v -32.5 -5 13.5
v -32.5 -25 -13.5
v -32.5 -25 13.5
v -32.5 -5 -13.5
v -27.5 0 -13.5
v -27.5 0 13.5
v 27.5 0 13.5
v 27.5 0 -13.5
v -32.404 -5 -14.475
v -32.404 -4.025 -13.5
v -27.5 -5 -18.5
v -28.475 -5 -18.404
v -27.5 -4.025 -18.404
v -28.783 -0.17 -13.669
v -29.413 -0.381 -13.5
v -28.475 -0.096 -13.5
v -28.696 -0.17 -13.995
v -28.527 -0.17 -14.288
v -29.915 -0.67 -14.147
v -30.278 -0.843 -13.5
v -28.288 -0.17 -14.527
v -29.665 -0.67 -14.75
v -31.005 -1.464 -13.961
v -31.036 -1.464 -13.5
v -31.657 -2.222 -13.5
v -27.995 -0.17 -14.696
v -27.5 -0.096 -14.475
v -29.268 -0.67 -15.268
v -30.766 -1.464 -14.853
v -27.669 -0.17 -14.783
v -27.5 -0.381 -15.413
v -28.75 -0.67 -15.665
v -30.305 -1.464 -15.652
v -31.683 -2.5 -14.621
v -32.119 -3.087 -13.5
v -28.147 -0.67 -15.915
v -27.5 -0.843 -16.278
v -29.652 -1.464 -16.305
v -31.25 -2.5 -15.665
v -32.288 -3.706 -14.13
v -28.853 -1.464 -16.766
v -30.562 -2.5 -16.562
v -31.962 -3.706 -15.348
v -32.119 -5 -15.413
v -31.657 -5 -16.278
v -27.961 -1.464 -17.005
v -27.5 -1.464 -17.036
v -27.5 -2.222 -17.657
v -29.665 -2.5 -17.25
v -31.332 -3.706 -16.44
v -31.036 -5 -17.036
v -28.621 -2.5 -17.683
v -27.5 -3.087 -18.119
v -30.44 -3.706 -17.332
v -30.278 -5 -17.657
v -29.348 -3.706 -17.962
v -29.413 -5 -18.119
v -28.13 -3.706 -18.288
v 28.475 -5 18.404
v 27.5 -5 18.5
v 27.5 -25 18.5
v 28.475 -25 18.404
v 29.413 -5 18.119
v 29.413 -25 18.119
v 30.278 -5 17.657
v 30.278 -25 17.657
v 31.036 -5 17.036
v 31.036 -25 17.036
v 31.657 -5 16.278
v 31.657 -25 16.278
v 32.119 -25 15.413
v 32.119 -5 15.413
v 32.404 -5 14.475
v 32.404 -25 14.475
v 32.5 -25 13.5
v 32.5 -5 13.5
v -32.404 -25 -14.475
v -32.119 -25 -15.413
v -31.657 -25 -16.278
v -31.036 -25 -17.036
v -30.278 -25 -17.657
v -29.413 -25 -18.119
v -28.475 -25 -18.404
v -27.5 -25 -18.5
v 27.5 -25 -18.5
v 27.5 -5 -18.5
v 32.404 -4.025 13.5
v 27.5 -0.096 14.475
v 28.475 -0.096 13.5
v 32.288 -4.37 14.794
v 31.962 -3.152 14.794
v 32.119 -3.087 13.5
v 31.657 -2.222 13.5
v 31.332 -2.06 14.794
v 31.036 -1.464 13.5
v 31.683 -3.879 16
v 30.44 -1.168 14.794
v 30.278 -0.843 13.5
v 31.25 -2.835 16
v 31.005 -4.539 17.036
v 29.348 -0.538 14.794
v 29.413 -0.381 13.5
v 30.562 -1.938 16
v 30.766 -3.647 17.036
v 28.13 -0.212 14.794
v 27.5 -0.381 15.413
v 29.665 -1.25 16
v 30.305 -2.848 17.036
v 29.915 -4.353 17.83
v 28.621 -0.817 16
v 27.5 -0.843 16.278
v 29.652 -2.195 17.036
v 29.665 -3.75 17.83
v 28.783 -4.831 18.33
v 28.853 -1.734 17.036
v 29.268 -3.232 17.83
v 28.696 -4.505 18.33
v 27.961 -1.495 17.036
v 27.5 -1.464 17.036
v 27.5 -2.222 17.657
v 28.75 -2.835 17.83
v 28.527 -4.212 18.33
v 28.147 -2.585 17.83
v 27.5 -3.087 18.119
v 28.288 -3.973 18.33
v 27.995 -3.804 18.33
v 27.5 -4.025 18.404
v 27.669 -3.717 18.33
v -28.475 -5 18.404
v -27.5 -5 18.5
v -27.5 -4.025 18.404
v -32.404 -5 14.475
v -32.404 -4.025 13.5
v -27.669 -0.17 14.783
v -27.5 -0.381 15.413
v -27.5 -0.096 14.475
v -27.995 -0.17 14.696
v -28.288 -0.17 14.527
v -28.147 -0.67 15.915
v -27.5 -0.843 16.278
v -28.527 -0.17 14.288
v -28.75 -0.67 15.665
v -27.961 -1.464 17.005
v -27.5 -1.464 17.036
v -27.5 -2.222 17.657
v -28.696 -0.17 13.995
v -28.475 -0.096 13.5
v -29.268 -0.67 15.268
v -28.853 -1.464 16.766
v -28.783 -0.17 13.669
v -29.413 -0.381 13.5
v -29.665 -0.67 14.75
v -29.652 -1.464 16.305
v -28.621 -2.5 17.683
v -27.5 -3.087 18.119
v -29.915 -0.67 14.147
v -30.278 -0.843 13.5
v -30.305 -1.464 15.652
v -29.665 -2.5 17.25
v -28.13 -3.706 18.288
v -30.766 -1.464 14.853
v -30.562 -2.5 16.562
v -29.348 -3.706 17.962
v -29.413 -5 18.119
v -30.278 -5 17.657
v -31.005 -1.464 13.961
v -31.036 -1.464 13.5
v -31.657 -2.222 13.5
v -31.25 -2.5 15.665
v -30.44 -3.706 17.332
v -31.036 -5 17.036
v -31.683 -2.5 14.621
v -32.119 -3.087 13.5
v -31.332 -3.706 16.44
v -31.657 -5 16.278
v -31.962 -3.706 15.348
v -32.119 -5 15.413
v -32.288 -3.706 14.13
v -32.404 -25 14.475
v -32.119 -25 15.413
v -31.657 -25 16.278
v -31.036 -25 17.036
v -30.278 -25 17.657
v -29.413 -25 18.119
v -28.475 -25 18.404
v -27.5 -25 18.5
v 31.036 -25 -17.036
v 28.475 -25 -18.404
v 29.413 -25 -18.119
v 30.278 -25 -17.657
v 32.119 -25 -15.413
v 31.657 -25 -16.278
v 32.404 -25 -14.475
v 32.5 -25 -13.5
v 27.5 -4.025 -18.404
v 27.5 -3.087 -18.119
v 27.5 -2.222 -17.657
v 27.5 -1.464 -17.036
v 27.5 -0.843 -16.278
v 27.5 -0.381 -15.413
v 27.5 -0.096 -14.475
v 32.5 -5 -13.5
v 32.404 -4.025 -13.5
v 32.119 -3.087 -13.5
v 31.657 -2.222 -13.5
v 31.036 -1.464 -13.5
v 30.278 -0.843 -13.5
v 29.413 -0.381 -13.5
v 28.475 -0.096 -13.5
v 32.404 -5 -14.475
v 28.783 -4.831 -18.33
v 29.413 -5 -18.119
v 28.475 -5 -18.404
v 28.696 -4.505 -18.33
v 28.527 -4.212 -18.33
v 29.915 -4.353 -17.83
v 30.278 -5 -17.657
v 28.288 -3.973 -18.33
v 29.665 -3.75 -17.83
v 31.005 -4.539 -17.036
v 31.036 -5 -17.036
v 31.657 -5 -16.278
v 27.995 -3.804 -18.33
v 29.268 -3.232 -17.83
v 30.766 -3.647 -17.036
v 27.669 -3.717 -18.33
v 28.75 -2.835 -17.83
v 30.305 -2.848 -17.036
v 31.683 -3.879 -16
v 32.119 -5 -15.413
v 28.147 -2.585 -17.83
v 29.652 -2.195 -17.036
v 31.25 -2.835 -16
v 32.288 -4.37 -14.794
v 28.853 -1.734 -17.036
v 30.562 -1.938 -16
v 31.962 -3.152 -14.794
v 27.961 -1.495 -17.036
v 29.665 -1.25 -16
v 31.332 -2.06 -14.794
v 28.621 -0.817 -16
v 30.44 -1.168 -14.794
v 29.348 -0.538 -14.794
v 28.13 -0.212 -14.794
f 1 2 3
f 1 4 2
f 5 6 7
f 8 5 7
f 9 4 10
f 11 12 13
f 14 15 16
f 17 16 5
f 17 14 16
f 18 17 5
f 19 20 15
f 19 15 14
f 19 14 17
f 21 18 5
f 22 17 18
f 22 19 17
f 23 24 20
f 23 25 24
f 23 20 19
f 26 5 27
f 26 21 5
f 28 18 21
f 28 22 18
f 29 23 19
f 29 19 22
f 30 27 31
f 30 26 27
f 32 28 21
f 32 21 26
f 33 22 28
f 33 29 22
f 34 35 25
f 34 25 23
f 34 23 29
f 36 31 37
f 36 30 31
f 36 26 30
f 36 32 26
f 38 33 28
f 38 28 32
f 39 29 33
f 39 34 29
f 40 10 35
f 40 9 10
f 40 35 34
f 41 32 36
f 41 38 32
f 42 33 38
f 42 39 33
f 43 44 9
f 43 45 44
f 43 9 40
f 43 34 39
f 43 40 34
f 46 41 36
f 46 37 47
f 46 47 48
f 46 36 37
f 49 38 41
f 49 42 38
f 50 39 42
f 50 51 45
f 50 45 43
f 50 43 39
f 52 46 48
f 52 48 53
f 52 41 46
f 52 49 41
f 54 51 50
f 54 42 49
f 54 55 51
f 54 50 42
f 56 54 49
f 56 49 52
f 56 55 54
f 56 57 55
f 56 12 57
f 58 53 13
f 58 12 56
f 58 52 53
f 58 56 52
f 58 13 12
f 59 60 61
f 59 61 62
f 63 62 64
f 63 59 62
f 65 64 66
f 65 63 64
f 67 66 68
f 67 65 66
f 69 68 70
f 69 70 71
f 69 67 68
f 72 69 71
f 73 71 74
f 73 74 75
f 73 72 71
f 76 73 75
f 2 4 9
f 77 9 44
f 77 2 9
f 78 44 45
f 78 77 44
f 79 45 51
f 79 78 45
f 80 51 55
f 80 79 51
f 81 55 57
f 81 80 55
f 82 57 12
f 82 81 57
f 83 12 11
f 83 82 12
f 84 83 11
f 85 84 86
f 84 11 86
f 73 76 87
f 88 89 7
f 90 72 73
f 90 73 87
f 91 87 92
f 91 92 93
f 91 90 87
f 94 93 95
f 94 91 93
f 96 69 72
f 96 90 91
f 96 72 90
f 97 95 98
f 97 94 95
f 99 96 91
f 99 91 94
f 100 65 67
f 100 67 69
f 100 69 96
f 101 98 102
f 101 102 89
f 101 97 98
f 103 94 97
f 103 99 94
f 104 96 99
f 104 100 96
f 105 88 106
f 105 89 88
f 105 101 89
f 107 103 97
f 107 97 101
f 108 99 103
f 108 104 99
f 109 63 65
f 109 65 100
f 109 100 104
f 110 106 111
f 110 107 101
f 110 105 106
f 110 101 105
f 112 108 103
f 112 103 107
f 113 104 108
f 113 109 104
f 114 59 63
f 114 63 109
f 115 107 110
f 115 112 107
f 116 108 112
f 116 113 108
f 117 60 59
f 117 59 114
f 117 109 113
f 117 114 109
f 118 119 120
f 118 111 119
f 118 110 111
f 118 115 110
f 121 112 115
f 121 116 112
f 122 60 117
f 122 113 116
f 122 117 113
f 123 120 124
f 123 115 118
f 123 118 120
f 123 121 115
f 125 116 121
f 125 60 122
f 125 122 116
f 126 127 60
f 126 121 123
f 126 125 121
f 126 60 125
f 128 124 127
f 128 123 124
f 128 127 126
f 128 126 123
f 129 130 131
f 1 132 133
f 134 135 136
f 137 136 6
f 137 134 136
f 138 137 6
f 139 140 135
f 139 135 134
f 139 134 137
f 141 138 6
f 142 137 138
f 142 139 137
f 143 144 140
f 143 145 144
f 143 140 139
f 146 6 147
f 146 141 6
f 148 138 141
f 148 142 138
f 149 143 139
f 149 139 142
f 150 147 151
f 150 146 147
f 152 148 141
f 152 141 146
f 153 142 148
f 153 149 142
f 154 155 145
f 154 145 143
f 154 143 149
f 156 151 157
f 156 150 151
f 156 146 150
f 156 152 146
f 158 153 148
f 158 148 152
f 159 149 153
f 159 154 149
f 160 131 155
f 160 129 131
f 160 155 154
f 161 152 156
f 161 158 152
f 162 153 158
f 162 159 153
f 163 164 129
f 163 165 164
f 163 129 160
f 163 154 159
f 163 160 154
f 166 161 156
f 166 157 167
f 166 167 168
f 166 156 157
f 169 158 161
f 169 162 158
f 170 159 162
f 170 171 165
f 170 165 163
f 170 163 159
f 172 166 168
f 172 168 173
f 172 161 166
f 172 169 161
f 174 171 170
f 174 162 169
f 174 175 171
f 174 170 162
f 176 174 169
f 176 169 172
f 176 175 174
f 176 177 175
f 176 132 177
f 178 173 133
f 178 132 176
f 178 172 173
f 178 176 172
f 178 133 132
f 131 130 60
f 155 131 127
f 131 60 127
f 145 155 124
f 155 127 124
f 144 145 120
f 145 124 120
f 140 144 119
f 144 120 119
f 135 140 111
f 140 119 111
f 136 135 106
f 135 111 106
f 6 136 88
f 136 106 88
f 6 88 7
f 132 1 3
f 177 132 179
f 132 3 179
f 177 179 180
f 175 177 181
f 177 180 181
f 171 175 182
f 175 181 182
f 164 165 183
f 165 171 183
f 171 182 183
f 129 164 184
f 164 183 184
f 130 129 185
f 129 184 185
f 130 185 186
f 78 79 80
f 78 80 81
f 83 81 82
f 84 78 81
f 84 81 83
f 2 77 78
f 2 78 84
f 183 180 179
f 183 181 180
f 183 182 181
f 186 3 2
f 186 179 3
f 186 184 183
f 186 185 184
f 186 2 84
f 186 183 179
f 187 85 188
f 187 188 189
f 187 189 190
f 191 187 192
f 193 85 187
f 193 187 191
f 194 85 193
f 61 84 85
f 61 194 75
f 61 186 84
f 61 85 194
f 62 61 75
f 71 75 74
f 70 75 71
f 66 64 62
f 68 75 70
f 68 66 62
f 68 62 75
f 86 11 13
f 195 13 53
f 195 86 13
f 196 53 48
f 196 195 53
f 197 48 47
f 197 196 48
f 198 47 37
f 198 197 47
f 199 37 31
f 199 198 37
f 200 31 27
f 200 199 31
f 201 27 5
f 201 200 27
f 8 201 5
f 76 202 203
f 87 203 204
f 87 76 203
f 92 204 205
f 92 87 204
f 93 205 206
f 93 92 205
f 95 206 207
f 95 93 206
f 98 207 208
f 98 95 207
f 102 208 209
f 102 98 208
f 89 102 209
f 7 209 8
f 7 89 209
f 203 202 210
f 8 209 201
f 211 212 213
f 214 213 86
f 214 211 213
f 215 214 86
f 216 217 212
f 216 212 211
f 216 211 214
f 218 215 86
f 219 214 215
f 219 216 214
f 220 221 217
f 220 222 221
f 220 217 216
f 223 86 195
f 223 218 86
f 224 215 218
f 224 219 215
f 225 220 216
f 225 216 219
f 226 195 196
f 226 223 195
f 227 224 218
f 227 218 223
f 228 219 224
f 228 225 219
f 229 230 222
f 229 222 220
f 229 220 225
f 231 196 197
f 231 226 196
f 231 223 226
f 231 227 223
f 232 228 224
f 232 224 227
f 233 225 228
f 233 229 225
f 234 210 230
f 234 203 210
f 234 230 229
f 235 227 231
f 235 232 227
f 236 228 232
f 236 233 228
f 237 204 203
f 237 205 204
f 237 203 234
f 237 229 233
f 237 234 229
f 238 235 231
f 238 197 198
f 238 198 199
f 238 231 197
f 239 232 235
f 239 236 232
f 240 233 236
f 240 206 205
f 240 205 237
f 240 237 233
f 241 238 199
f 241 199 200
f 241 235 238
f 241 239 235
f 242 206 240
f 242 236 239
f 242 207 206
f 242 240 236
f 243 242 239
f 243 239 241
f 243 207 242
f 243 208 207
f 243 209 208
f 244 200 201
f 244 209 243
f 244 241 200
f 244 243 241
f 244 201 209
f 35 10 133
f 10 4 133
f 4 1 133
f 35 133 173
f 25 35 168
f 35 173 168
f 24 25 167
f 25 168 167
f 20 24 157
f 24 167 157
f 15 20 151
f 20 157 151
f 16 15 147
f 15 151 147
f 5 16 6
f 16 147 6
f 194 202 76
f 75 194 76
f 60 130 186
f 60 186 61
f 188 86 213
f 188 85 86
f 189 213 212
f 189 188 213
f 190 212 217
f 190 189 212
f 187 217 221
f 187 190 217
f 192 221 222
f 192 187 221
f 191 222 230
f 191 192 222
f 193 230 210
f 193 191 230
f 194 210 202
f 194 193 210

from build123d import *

# Parameters (mm, degrees)
F0_W        = 65
F0_H        = 37
F1_DEPTH    = 25
F2_R        = 5
F3_T1_DEPTH = 32.5
F3_S5_W     = 5
F3_S5_H     = 5
F3_T6_DEPTH = 5


# Not quite as in the source:
# - a fillet or chamfer that OpenCascade refuses, or shapes differently, is made with other operations: its cross-section is extruded or revolved along the edge and cut away or added


with BuildPart() as f1:
    # F0 (on Front) → F1 (new body)
    with BuildSketch(Plane.XZ):
        Rectangle(F0_W, F0_H)
    extrude(amount=F1_DEPTH)

    # F2
    f2_edges = [f1.edges().sort_by_distance(p)[0] for p in [
        (-32.5, -12.5, 18.5),
        (-32.5, -12.5, -18.5),
        (0, 0, 18.5),
        (-32.5, 0, 0),
        (32.5, 0, 0),
        (32.5, -12.5, -18.5),
        (0, 0, -18.5),
    ]]
    fillet(f2_edges, radius=F2_R)

    # F3: fillet of radius 5 on 1 edges, made by hand

    # F3_s2 → F3_t1 (cut)
    with BuildSketch(Plane.XZ.offset(5)):
        with BuildLine():
            ThreePointArc((27.5, 18.5), (31.0355339059, 17.0355339059), (32.5, 13.5))
            Line((32.5, 13.5), (32.5, 18.5))
            Line((32.5, 18.5), (27.5, 18.5))
        make_face()
    extrude(amount=F3_T1_DEPTH, mode=Mode.SUBTRACT)


with BuildPart() as f3_tool4:
    # F3_s5 → F3_t6 (new body)
    with BuildSketch(Plane.XY.offset(13.5)):
        with Locations((30, -2.5)):
            Rectangle(F3_S5_W, F3_S5_H)
    extrude(amount=F3_T6_DEPTH)

    # F3_s7 → F3_t8 (revolve, cut)
    with BuildSketch(Plane(origin=(27.5, -5, 13.5), x_dir=(-0.7071067812, -0.7071067812, 0), z_dir=(-0.7071067812, 0.7071067812, 0))):
        with BuildLine():
            ThreePointArc((0, -5), (5, 0), (0, 5))
            Line((0, 5), (0, -5))
        make_face()
    revolve(axis=Axis((27.5, -5, 13.5), (0, 0, 1)), mode=Mode.SUBTRACT)


with BuildPart() as f1_1:
    add(f1.part)

    # F3_t3: cut F3_tool4
    add(f3_tool4.part, mode=Mode.SUBTRACT)


solid = f1_1.part
